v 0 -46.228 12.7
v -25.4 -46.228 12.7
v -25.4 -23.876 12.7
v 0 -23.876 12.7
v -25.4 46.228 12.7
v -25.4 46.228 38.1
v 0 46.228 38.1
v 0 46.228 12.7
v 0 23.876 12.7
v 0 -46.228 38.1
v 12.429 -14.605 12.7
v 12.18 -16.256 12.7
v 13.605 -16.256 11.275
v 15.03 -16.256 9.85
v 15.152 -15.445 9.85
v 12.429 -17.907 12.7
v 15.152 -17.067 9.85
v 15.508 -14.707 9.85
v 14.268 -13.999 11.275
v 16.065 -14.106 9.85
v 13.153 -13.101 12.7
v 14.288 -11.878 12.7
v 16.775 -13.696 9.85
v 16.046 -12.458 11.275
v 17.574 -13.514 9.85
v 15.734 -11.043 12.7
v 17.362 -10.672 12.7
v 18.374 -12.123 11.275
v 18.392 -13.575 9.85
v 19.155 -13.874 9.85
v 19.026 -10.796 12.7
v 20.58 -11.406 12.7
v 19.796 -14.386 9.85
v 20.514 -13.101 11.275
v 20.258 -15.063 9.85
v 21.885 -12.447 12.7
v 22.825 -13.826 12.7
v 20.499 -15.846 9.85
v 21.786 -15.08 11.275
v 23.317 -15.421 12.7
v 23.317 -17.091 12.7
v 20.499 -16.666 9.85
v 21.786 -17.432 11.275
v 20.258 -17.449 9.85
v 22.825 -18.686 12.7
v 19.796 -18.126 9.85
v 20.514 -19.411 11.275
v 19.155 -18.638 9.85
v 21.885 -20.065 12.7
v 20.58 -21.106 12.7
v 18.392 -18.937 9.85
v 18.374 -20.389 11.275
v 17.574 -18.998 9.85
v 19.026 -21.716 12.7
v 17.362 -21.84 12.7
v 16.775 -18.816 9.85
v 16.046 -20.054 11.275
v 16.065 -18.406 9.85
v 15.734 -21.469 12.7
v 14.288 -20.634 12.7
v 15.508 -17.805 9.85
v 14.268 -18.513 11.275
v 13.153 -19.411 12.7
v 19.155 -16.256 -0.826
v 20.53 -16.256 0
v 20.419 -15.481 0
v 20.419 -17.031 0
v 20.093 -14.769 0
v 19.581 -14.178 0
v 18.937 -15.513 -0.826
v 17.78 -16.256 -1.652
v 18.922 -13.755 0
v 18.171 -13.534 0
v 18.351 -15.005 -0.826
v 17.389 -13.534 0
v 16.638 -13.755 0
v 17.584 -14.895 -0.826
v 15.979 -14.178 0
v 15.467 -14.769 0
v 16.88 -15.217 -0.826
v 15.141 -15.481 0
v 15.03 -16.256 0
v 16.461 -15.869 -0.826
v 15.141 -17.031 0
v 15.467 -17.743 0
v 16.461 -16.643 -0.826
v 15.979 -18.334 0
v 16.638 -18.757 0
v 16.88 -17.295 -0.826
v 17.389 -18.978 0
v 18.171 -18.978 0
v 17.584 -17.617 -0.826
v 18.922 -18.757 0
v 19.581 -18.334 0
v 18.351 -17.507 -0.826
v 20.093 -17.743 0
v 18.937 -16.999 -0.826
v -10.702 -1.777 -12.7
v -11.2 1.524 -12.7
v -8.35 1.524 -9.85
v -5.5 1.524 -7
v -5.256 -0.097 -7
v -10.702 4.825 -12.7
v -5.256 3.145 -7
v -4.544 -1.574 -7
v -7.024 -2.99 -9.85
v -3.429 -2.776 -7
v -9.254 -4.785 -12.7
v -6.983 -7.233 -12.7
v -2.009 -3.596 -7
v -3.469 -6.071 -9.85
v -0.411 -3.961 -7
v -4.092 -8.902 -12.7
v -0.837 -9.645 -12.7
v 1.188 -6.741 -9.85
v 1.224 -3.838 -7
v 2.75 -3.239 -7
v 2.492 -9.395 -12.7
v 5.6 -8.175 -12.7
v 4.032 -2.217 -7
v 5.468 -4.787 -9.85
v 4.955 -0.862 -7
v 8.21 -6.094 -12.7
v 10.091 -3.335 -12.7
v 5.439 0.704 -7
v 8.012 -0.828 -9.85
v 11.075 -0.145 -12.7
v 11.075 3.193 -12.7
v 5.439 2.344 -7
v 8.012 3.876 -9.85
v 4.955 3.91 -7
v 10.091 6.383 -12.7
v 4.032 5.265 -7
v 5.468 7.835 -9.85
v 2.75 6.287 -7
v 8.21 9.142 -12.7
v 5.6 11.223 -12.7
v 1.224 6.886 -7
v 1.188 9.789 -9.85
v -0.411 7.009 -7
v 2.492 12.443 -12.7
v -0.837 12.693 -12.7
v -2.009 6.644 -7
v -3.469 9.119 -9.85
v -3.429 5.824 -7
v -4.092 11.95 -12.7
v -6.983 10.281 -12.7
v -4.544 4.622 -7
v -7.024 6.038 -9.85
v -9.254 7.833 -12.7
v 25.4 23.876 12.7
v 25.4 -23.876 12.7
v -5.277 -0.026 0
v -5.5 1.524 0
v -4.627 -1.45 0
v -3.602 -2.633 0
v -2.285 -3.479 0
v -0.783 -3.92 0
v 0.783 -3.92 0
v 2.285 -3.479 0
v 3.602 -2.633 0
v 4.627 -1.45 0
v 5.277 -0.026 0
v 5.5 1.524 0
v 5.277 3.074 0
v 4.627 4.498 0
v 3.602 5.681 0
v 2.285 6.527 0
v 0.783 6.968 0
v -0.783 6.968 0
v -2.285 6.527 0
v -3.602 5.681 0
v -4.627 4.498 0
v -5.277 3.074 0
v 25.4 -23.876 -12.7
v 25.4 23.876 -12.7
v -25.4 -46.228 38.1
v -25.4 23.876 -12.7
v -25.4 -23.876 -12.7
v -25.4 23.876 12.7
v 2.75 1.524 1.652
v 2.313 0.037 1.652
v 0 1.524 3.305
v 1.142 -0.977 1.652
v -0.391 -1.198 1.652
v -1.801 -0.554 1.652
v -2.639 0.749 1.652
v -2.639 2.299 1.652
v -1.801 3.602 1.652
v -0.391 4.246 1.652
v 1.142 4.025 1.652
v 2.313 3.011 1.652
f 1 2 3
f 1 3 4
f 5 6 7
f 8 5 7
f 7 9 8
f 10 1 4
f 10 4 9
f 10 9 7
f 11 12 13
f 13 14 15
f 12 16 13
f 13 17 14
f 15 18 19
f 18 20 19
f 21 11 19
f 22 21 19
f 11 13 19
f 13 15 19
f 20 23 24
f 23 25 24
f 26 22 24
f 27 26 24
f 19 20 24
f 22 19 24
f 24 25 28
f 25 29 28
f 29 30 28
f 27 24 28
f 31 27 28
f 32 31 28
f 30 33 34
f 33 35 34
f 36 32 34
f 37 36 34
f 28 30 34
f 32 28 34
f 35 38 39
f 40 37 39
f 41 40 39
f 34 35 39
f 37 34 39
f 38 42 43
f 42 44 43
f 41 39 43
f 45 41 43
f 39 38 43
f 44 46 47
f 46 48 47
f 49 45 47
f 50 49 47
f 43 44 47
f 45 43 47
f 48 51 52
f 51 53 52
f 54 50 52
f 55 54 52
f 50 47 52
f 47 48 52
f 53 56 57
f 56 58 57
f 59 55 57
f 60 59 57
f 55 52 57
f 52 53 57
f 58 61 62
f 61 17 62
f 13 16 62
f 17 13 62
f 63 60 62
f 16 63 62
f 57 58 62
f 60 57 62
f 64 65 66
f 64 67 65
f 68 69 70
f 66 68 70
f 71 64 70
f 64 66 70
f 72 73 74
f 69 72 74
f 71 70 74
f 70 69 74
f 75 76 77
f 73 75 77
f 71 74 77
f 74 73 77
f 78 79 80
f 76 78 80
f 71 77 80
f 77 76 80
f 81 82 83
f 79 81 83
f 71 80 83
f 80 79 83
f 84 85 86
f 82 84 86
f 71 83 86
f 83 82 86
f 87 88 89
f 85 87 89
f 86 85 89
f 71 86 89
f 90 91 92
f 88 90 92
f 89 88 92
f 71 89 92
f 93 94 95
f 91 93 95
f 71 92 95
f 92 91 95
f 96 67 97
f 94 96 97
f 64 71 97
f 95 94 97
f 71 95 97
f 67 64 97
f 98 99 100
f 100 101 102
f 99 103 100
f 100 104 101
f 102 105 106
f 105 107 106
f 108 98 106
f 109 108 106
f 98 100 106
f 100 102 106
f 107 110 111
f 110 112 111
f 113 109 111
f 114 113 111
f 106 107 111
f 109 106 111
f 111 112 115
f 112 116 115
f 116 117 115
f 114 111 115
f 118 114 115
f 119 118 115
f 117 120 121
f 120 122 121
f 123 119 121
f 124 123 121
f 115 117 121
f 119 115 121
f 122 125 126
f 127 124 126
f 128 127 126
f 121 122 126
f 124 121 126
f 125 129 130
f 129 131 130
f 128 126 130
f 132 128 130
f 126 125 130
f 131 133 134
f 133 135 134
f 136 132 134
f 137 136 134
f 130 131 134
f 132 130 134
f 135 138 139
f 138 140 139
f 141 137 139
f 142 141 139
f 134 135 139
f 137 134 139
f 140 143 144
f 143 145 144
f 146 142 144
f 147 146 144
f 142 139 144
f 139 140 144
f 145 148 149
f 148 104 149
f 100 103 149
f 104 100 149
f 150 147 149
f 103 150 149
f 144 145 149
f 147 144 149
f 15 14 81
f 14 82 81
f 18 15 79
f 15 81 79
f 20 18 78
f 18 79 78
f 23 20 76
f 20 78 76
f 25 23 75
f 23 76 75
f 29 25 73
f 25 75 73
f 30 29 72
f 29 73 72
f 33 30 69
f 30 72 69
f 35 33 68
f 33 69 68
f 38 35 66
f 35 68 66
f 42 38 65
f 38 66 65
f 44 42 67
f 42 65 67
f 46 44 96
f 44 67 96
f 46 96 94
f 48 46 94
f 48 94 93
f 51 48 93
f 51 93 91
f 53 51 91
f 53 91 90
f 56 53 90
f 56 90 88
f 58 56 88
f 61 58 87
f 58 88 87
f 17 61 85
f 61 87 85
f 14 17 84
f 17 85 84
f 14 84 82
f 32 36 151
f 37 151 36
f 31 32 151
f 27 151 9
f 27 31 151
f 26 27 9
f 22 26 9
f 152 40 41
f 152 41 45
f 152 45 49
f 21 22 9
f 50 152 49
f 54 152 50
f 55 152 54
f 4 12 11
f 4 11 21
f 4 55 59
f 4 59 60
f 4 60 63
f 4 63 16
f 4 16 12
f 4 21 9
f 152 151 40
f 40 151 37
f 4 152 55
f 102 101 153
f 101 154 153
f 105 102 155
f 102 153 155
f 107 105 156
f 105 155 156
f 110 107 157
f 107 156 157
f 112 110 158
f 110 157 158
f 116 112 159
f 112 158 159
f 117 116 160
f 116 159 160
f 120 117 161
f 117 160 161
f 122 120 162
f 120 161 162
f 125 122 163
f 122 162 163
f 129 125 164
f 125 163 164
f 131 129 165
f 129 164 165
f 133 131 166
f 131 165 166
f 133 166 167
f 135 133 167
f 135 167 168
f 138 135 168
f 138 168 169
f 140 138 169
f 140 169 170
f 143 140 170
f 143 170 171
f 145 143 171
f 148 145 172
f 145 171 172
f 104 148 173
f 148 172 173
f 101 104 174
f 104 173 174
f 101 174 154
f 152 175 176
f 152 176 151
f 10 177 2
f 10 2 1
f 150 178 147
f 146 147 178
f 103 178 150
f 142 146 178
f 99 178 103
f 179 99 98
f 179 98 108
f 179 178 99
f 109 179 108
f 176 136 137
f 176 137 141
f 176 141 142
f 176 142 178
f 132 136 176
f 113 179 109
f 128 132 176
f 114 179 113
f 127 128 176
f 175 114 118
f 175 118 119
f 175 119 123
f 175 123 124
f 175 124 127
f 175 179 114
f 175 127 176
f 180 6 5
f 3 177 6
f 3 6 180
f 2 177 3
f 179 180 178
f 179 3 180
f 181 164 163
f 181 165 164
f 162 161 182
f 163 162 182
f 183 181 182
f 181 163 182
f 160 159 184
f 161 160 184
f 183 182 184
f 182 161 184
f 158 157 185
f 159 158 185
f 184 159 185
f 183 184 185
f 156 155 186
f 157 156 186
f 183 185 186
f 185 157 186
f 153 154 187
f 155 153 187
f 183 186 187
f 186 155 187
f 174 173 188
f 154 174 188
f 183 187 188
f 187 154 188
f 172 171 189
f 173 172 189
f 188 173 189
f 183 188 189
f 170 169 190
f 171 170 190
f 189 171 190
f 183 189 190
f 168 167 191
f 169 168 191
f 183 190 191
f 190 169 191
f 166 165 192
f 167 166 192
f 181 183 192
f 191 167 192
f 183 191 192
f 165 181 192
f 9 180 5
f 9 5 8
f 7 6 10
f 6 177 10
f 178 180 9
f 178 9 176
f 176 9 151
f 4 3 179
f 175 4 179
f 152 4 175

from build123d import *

# Parameters (mm, degrees)
F1_W           = 25.4
F1_H           = 25.4
F3_DEPTH       = 46.228
F4_DEPTH       = 23.876
F6_D           = 11
F6_DEPTH       = 12.7
F6_CSINK_D     = 22.4
F6_CSINK_ANGLE = 90
F6_TIP         = 3.3047334047
F8_D           = 5.5
F8_DEPTH       = 12.7
F8_CSINK_D     = 11.2
F8_CSINK_ANGLE = 90
F8_TIP         = 1.6523667023


with BuildPart() as f3:
    # F1 (on face) → F3 (new body, symmetric)
    with BuildSketch(Plane.XZ):
        with Locations((-12.7, 25.4)):
            Rectangle(F1_W, F1_H)
    extrude(amount=F3_DEPTH, both=True)

    # F2 (on face) → F4 (join, symmetric)
    with BuildSketch(Plane.XZ):
        Polygon((0, 12.7), (-25.4, 12.7), (-25.4, -12.7), (25.4, -12.7), (25.4, 12.7), align=None)
    extrude(amount=F4_DEPTH, both=True)

    # F6
    with Locations(Plane(origin=(0, 0, -12.7), x_dir=(1, 0, 0), z_dir=(0, 0, -1))):
        with Locations((0, -1.524)):
            CounterSinkHole(F6_D / 2, F6_CSINK_D / 2, depth=F6_DEPTH, counter_sink_angle=F6_CSINK_ANGLE)
            with Locations((0, 0, -(F6_DEPTH + F6_TIP / 2))):  # 118° drill point
                Cone(0, F6_D / 2, F6_TIP, mode=Mode.SUBTRACT)

    # F8
    with Locations(Plane.XY.offset(12.7)):
        with Locations((17.78, -16.256)):
            CounterSinkHole(F8_D / 2, F8_CSINK_D / 2, depth=F8_DEPTH, counter_sink_angle=F8_CSINK_ANGLE)
            with Locations((0, 0, -(F8_DEPTH + F8_TIP / 2))):  # 118° drill point
                Cone(0, F8_D / 2, F8_TIP, mode=Mode.SUBTRACT)


solid = f3.part
